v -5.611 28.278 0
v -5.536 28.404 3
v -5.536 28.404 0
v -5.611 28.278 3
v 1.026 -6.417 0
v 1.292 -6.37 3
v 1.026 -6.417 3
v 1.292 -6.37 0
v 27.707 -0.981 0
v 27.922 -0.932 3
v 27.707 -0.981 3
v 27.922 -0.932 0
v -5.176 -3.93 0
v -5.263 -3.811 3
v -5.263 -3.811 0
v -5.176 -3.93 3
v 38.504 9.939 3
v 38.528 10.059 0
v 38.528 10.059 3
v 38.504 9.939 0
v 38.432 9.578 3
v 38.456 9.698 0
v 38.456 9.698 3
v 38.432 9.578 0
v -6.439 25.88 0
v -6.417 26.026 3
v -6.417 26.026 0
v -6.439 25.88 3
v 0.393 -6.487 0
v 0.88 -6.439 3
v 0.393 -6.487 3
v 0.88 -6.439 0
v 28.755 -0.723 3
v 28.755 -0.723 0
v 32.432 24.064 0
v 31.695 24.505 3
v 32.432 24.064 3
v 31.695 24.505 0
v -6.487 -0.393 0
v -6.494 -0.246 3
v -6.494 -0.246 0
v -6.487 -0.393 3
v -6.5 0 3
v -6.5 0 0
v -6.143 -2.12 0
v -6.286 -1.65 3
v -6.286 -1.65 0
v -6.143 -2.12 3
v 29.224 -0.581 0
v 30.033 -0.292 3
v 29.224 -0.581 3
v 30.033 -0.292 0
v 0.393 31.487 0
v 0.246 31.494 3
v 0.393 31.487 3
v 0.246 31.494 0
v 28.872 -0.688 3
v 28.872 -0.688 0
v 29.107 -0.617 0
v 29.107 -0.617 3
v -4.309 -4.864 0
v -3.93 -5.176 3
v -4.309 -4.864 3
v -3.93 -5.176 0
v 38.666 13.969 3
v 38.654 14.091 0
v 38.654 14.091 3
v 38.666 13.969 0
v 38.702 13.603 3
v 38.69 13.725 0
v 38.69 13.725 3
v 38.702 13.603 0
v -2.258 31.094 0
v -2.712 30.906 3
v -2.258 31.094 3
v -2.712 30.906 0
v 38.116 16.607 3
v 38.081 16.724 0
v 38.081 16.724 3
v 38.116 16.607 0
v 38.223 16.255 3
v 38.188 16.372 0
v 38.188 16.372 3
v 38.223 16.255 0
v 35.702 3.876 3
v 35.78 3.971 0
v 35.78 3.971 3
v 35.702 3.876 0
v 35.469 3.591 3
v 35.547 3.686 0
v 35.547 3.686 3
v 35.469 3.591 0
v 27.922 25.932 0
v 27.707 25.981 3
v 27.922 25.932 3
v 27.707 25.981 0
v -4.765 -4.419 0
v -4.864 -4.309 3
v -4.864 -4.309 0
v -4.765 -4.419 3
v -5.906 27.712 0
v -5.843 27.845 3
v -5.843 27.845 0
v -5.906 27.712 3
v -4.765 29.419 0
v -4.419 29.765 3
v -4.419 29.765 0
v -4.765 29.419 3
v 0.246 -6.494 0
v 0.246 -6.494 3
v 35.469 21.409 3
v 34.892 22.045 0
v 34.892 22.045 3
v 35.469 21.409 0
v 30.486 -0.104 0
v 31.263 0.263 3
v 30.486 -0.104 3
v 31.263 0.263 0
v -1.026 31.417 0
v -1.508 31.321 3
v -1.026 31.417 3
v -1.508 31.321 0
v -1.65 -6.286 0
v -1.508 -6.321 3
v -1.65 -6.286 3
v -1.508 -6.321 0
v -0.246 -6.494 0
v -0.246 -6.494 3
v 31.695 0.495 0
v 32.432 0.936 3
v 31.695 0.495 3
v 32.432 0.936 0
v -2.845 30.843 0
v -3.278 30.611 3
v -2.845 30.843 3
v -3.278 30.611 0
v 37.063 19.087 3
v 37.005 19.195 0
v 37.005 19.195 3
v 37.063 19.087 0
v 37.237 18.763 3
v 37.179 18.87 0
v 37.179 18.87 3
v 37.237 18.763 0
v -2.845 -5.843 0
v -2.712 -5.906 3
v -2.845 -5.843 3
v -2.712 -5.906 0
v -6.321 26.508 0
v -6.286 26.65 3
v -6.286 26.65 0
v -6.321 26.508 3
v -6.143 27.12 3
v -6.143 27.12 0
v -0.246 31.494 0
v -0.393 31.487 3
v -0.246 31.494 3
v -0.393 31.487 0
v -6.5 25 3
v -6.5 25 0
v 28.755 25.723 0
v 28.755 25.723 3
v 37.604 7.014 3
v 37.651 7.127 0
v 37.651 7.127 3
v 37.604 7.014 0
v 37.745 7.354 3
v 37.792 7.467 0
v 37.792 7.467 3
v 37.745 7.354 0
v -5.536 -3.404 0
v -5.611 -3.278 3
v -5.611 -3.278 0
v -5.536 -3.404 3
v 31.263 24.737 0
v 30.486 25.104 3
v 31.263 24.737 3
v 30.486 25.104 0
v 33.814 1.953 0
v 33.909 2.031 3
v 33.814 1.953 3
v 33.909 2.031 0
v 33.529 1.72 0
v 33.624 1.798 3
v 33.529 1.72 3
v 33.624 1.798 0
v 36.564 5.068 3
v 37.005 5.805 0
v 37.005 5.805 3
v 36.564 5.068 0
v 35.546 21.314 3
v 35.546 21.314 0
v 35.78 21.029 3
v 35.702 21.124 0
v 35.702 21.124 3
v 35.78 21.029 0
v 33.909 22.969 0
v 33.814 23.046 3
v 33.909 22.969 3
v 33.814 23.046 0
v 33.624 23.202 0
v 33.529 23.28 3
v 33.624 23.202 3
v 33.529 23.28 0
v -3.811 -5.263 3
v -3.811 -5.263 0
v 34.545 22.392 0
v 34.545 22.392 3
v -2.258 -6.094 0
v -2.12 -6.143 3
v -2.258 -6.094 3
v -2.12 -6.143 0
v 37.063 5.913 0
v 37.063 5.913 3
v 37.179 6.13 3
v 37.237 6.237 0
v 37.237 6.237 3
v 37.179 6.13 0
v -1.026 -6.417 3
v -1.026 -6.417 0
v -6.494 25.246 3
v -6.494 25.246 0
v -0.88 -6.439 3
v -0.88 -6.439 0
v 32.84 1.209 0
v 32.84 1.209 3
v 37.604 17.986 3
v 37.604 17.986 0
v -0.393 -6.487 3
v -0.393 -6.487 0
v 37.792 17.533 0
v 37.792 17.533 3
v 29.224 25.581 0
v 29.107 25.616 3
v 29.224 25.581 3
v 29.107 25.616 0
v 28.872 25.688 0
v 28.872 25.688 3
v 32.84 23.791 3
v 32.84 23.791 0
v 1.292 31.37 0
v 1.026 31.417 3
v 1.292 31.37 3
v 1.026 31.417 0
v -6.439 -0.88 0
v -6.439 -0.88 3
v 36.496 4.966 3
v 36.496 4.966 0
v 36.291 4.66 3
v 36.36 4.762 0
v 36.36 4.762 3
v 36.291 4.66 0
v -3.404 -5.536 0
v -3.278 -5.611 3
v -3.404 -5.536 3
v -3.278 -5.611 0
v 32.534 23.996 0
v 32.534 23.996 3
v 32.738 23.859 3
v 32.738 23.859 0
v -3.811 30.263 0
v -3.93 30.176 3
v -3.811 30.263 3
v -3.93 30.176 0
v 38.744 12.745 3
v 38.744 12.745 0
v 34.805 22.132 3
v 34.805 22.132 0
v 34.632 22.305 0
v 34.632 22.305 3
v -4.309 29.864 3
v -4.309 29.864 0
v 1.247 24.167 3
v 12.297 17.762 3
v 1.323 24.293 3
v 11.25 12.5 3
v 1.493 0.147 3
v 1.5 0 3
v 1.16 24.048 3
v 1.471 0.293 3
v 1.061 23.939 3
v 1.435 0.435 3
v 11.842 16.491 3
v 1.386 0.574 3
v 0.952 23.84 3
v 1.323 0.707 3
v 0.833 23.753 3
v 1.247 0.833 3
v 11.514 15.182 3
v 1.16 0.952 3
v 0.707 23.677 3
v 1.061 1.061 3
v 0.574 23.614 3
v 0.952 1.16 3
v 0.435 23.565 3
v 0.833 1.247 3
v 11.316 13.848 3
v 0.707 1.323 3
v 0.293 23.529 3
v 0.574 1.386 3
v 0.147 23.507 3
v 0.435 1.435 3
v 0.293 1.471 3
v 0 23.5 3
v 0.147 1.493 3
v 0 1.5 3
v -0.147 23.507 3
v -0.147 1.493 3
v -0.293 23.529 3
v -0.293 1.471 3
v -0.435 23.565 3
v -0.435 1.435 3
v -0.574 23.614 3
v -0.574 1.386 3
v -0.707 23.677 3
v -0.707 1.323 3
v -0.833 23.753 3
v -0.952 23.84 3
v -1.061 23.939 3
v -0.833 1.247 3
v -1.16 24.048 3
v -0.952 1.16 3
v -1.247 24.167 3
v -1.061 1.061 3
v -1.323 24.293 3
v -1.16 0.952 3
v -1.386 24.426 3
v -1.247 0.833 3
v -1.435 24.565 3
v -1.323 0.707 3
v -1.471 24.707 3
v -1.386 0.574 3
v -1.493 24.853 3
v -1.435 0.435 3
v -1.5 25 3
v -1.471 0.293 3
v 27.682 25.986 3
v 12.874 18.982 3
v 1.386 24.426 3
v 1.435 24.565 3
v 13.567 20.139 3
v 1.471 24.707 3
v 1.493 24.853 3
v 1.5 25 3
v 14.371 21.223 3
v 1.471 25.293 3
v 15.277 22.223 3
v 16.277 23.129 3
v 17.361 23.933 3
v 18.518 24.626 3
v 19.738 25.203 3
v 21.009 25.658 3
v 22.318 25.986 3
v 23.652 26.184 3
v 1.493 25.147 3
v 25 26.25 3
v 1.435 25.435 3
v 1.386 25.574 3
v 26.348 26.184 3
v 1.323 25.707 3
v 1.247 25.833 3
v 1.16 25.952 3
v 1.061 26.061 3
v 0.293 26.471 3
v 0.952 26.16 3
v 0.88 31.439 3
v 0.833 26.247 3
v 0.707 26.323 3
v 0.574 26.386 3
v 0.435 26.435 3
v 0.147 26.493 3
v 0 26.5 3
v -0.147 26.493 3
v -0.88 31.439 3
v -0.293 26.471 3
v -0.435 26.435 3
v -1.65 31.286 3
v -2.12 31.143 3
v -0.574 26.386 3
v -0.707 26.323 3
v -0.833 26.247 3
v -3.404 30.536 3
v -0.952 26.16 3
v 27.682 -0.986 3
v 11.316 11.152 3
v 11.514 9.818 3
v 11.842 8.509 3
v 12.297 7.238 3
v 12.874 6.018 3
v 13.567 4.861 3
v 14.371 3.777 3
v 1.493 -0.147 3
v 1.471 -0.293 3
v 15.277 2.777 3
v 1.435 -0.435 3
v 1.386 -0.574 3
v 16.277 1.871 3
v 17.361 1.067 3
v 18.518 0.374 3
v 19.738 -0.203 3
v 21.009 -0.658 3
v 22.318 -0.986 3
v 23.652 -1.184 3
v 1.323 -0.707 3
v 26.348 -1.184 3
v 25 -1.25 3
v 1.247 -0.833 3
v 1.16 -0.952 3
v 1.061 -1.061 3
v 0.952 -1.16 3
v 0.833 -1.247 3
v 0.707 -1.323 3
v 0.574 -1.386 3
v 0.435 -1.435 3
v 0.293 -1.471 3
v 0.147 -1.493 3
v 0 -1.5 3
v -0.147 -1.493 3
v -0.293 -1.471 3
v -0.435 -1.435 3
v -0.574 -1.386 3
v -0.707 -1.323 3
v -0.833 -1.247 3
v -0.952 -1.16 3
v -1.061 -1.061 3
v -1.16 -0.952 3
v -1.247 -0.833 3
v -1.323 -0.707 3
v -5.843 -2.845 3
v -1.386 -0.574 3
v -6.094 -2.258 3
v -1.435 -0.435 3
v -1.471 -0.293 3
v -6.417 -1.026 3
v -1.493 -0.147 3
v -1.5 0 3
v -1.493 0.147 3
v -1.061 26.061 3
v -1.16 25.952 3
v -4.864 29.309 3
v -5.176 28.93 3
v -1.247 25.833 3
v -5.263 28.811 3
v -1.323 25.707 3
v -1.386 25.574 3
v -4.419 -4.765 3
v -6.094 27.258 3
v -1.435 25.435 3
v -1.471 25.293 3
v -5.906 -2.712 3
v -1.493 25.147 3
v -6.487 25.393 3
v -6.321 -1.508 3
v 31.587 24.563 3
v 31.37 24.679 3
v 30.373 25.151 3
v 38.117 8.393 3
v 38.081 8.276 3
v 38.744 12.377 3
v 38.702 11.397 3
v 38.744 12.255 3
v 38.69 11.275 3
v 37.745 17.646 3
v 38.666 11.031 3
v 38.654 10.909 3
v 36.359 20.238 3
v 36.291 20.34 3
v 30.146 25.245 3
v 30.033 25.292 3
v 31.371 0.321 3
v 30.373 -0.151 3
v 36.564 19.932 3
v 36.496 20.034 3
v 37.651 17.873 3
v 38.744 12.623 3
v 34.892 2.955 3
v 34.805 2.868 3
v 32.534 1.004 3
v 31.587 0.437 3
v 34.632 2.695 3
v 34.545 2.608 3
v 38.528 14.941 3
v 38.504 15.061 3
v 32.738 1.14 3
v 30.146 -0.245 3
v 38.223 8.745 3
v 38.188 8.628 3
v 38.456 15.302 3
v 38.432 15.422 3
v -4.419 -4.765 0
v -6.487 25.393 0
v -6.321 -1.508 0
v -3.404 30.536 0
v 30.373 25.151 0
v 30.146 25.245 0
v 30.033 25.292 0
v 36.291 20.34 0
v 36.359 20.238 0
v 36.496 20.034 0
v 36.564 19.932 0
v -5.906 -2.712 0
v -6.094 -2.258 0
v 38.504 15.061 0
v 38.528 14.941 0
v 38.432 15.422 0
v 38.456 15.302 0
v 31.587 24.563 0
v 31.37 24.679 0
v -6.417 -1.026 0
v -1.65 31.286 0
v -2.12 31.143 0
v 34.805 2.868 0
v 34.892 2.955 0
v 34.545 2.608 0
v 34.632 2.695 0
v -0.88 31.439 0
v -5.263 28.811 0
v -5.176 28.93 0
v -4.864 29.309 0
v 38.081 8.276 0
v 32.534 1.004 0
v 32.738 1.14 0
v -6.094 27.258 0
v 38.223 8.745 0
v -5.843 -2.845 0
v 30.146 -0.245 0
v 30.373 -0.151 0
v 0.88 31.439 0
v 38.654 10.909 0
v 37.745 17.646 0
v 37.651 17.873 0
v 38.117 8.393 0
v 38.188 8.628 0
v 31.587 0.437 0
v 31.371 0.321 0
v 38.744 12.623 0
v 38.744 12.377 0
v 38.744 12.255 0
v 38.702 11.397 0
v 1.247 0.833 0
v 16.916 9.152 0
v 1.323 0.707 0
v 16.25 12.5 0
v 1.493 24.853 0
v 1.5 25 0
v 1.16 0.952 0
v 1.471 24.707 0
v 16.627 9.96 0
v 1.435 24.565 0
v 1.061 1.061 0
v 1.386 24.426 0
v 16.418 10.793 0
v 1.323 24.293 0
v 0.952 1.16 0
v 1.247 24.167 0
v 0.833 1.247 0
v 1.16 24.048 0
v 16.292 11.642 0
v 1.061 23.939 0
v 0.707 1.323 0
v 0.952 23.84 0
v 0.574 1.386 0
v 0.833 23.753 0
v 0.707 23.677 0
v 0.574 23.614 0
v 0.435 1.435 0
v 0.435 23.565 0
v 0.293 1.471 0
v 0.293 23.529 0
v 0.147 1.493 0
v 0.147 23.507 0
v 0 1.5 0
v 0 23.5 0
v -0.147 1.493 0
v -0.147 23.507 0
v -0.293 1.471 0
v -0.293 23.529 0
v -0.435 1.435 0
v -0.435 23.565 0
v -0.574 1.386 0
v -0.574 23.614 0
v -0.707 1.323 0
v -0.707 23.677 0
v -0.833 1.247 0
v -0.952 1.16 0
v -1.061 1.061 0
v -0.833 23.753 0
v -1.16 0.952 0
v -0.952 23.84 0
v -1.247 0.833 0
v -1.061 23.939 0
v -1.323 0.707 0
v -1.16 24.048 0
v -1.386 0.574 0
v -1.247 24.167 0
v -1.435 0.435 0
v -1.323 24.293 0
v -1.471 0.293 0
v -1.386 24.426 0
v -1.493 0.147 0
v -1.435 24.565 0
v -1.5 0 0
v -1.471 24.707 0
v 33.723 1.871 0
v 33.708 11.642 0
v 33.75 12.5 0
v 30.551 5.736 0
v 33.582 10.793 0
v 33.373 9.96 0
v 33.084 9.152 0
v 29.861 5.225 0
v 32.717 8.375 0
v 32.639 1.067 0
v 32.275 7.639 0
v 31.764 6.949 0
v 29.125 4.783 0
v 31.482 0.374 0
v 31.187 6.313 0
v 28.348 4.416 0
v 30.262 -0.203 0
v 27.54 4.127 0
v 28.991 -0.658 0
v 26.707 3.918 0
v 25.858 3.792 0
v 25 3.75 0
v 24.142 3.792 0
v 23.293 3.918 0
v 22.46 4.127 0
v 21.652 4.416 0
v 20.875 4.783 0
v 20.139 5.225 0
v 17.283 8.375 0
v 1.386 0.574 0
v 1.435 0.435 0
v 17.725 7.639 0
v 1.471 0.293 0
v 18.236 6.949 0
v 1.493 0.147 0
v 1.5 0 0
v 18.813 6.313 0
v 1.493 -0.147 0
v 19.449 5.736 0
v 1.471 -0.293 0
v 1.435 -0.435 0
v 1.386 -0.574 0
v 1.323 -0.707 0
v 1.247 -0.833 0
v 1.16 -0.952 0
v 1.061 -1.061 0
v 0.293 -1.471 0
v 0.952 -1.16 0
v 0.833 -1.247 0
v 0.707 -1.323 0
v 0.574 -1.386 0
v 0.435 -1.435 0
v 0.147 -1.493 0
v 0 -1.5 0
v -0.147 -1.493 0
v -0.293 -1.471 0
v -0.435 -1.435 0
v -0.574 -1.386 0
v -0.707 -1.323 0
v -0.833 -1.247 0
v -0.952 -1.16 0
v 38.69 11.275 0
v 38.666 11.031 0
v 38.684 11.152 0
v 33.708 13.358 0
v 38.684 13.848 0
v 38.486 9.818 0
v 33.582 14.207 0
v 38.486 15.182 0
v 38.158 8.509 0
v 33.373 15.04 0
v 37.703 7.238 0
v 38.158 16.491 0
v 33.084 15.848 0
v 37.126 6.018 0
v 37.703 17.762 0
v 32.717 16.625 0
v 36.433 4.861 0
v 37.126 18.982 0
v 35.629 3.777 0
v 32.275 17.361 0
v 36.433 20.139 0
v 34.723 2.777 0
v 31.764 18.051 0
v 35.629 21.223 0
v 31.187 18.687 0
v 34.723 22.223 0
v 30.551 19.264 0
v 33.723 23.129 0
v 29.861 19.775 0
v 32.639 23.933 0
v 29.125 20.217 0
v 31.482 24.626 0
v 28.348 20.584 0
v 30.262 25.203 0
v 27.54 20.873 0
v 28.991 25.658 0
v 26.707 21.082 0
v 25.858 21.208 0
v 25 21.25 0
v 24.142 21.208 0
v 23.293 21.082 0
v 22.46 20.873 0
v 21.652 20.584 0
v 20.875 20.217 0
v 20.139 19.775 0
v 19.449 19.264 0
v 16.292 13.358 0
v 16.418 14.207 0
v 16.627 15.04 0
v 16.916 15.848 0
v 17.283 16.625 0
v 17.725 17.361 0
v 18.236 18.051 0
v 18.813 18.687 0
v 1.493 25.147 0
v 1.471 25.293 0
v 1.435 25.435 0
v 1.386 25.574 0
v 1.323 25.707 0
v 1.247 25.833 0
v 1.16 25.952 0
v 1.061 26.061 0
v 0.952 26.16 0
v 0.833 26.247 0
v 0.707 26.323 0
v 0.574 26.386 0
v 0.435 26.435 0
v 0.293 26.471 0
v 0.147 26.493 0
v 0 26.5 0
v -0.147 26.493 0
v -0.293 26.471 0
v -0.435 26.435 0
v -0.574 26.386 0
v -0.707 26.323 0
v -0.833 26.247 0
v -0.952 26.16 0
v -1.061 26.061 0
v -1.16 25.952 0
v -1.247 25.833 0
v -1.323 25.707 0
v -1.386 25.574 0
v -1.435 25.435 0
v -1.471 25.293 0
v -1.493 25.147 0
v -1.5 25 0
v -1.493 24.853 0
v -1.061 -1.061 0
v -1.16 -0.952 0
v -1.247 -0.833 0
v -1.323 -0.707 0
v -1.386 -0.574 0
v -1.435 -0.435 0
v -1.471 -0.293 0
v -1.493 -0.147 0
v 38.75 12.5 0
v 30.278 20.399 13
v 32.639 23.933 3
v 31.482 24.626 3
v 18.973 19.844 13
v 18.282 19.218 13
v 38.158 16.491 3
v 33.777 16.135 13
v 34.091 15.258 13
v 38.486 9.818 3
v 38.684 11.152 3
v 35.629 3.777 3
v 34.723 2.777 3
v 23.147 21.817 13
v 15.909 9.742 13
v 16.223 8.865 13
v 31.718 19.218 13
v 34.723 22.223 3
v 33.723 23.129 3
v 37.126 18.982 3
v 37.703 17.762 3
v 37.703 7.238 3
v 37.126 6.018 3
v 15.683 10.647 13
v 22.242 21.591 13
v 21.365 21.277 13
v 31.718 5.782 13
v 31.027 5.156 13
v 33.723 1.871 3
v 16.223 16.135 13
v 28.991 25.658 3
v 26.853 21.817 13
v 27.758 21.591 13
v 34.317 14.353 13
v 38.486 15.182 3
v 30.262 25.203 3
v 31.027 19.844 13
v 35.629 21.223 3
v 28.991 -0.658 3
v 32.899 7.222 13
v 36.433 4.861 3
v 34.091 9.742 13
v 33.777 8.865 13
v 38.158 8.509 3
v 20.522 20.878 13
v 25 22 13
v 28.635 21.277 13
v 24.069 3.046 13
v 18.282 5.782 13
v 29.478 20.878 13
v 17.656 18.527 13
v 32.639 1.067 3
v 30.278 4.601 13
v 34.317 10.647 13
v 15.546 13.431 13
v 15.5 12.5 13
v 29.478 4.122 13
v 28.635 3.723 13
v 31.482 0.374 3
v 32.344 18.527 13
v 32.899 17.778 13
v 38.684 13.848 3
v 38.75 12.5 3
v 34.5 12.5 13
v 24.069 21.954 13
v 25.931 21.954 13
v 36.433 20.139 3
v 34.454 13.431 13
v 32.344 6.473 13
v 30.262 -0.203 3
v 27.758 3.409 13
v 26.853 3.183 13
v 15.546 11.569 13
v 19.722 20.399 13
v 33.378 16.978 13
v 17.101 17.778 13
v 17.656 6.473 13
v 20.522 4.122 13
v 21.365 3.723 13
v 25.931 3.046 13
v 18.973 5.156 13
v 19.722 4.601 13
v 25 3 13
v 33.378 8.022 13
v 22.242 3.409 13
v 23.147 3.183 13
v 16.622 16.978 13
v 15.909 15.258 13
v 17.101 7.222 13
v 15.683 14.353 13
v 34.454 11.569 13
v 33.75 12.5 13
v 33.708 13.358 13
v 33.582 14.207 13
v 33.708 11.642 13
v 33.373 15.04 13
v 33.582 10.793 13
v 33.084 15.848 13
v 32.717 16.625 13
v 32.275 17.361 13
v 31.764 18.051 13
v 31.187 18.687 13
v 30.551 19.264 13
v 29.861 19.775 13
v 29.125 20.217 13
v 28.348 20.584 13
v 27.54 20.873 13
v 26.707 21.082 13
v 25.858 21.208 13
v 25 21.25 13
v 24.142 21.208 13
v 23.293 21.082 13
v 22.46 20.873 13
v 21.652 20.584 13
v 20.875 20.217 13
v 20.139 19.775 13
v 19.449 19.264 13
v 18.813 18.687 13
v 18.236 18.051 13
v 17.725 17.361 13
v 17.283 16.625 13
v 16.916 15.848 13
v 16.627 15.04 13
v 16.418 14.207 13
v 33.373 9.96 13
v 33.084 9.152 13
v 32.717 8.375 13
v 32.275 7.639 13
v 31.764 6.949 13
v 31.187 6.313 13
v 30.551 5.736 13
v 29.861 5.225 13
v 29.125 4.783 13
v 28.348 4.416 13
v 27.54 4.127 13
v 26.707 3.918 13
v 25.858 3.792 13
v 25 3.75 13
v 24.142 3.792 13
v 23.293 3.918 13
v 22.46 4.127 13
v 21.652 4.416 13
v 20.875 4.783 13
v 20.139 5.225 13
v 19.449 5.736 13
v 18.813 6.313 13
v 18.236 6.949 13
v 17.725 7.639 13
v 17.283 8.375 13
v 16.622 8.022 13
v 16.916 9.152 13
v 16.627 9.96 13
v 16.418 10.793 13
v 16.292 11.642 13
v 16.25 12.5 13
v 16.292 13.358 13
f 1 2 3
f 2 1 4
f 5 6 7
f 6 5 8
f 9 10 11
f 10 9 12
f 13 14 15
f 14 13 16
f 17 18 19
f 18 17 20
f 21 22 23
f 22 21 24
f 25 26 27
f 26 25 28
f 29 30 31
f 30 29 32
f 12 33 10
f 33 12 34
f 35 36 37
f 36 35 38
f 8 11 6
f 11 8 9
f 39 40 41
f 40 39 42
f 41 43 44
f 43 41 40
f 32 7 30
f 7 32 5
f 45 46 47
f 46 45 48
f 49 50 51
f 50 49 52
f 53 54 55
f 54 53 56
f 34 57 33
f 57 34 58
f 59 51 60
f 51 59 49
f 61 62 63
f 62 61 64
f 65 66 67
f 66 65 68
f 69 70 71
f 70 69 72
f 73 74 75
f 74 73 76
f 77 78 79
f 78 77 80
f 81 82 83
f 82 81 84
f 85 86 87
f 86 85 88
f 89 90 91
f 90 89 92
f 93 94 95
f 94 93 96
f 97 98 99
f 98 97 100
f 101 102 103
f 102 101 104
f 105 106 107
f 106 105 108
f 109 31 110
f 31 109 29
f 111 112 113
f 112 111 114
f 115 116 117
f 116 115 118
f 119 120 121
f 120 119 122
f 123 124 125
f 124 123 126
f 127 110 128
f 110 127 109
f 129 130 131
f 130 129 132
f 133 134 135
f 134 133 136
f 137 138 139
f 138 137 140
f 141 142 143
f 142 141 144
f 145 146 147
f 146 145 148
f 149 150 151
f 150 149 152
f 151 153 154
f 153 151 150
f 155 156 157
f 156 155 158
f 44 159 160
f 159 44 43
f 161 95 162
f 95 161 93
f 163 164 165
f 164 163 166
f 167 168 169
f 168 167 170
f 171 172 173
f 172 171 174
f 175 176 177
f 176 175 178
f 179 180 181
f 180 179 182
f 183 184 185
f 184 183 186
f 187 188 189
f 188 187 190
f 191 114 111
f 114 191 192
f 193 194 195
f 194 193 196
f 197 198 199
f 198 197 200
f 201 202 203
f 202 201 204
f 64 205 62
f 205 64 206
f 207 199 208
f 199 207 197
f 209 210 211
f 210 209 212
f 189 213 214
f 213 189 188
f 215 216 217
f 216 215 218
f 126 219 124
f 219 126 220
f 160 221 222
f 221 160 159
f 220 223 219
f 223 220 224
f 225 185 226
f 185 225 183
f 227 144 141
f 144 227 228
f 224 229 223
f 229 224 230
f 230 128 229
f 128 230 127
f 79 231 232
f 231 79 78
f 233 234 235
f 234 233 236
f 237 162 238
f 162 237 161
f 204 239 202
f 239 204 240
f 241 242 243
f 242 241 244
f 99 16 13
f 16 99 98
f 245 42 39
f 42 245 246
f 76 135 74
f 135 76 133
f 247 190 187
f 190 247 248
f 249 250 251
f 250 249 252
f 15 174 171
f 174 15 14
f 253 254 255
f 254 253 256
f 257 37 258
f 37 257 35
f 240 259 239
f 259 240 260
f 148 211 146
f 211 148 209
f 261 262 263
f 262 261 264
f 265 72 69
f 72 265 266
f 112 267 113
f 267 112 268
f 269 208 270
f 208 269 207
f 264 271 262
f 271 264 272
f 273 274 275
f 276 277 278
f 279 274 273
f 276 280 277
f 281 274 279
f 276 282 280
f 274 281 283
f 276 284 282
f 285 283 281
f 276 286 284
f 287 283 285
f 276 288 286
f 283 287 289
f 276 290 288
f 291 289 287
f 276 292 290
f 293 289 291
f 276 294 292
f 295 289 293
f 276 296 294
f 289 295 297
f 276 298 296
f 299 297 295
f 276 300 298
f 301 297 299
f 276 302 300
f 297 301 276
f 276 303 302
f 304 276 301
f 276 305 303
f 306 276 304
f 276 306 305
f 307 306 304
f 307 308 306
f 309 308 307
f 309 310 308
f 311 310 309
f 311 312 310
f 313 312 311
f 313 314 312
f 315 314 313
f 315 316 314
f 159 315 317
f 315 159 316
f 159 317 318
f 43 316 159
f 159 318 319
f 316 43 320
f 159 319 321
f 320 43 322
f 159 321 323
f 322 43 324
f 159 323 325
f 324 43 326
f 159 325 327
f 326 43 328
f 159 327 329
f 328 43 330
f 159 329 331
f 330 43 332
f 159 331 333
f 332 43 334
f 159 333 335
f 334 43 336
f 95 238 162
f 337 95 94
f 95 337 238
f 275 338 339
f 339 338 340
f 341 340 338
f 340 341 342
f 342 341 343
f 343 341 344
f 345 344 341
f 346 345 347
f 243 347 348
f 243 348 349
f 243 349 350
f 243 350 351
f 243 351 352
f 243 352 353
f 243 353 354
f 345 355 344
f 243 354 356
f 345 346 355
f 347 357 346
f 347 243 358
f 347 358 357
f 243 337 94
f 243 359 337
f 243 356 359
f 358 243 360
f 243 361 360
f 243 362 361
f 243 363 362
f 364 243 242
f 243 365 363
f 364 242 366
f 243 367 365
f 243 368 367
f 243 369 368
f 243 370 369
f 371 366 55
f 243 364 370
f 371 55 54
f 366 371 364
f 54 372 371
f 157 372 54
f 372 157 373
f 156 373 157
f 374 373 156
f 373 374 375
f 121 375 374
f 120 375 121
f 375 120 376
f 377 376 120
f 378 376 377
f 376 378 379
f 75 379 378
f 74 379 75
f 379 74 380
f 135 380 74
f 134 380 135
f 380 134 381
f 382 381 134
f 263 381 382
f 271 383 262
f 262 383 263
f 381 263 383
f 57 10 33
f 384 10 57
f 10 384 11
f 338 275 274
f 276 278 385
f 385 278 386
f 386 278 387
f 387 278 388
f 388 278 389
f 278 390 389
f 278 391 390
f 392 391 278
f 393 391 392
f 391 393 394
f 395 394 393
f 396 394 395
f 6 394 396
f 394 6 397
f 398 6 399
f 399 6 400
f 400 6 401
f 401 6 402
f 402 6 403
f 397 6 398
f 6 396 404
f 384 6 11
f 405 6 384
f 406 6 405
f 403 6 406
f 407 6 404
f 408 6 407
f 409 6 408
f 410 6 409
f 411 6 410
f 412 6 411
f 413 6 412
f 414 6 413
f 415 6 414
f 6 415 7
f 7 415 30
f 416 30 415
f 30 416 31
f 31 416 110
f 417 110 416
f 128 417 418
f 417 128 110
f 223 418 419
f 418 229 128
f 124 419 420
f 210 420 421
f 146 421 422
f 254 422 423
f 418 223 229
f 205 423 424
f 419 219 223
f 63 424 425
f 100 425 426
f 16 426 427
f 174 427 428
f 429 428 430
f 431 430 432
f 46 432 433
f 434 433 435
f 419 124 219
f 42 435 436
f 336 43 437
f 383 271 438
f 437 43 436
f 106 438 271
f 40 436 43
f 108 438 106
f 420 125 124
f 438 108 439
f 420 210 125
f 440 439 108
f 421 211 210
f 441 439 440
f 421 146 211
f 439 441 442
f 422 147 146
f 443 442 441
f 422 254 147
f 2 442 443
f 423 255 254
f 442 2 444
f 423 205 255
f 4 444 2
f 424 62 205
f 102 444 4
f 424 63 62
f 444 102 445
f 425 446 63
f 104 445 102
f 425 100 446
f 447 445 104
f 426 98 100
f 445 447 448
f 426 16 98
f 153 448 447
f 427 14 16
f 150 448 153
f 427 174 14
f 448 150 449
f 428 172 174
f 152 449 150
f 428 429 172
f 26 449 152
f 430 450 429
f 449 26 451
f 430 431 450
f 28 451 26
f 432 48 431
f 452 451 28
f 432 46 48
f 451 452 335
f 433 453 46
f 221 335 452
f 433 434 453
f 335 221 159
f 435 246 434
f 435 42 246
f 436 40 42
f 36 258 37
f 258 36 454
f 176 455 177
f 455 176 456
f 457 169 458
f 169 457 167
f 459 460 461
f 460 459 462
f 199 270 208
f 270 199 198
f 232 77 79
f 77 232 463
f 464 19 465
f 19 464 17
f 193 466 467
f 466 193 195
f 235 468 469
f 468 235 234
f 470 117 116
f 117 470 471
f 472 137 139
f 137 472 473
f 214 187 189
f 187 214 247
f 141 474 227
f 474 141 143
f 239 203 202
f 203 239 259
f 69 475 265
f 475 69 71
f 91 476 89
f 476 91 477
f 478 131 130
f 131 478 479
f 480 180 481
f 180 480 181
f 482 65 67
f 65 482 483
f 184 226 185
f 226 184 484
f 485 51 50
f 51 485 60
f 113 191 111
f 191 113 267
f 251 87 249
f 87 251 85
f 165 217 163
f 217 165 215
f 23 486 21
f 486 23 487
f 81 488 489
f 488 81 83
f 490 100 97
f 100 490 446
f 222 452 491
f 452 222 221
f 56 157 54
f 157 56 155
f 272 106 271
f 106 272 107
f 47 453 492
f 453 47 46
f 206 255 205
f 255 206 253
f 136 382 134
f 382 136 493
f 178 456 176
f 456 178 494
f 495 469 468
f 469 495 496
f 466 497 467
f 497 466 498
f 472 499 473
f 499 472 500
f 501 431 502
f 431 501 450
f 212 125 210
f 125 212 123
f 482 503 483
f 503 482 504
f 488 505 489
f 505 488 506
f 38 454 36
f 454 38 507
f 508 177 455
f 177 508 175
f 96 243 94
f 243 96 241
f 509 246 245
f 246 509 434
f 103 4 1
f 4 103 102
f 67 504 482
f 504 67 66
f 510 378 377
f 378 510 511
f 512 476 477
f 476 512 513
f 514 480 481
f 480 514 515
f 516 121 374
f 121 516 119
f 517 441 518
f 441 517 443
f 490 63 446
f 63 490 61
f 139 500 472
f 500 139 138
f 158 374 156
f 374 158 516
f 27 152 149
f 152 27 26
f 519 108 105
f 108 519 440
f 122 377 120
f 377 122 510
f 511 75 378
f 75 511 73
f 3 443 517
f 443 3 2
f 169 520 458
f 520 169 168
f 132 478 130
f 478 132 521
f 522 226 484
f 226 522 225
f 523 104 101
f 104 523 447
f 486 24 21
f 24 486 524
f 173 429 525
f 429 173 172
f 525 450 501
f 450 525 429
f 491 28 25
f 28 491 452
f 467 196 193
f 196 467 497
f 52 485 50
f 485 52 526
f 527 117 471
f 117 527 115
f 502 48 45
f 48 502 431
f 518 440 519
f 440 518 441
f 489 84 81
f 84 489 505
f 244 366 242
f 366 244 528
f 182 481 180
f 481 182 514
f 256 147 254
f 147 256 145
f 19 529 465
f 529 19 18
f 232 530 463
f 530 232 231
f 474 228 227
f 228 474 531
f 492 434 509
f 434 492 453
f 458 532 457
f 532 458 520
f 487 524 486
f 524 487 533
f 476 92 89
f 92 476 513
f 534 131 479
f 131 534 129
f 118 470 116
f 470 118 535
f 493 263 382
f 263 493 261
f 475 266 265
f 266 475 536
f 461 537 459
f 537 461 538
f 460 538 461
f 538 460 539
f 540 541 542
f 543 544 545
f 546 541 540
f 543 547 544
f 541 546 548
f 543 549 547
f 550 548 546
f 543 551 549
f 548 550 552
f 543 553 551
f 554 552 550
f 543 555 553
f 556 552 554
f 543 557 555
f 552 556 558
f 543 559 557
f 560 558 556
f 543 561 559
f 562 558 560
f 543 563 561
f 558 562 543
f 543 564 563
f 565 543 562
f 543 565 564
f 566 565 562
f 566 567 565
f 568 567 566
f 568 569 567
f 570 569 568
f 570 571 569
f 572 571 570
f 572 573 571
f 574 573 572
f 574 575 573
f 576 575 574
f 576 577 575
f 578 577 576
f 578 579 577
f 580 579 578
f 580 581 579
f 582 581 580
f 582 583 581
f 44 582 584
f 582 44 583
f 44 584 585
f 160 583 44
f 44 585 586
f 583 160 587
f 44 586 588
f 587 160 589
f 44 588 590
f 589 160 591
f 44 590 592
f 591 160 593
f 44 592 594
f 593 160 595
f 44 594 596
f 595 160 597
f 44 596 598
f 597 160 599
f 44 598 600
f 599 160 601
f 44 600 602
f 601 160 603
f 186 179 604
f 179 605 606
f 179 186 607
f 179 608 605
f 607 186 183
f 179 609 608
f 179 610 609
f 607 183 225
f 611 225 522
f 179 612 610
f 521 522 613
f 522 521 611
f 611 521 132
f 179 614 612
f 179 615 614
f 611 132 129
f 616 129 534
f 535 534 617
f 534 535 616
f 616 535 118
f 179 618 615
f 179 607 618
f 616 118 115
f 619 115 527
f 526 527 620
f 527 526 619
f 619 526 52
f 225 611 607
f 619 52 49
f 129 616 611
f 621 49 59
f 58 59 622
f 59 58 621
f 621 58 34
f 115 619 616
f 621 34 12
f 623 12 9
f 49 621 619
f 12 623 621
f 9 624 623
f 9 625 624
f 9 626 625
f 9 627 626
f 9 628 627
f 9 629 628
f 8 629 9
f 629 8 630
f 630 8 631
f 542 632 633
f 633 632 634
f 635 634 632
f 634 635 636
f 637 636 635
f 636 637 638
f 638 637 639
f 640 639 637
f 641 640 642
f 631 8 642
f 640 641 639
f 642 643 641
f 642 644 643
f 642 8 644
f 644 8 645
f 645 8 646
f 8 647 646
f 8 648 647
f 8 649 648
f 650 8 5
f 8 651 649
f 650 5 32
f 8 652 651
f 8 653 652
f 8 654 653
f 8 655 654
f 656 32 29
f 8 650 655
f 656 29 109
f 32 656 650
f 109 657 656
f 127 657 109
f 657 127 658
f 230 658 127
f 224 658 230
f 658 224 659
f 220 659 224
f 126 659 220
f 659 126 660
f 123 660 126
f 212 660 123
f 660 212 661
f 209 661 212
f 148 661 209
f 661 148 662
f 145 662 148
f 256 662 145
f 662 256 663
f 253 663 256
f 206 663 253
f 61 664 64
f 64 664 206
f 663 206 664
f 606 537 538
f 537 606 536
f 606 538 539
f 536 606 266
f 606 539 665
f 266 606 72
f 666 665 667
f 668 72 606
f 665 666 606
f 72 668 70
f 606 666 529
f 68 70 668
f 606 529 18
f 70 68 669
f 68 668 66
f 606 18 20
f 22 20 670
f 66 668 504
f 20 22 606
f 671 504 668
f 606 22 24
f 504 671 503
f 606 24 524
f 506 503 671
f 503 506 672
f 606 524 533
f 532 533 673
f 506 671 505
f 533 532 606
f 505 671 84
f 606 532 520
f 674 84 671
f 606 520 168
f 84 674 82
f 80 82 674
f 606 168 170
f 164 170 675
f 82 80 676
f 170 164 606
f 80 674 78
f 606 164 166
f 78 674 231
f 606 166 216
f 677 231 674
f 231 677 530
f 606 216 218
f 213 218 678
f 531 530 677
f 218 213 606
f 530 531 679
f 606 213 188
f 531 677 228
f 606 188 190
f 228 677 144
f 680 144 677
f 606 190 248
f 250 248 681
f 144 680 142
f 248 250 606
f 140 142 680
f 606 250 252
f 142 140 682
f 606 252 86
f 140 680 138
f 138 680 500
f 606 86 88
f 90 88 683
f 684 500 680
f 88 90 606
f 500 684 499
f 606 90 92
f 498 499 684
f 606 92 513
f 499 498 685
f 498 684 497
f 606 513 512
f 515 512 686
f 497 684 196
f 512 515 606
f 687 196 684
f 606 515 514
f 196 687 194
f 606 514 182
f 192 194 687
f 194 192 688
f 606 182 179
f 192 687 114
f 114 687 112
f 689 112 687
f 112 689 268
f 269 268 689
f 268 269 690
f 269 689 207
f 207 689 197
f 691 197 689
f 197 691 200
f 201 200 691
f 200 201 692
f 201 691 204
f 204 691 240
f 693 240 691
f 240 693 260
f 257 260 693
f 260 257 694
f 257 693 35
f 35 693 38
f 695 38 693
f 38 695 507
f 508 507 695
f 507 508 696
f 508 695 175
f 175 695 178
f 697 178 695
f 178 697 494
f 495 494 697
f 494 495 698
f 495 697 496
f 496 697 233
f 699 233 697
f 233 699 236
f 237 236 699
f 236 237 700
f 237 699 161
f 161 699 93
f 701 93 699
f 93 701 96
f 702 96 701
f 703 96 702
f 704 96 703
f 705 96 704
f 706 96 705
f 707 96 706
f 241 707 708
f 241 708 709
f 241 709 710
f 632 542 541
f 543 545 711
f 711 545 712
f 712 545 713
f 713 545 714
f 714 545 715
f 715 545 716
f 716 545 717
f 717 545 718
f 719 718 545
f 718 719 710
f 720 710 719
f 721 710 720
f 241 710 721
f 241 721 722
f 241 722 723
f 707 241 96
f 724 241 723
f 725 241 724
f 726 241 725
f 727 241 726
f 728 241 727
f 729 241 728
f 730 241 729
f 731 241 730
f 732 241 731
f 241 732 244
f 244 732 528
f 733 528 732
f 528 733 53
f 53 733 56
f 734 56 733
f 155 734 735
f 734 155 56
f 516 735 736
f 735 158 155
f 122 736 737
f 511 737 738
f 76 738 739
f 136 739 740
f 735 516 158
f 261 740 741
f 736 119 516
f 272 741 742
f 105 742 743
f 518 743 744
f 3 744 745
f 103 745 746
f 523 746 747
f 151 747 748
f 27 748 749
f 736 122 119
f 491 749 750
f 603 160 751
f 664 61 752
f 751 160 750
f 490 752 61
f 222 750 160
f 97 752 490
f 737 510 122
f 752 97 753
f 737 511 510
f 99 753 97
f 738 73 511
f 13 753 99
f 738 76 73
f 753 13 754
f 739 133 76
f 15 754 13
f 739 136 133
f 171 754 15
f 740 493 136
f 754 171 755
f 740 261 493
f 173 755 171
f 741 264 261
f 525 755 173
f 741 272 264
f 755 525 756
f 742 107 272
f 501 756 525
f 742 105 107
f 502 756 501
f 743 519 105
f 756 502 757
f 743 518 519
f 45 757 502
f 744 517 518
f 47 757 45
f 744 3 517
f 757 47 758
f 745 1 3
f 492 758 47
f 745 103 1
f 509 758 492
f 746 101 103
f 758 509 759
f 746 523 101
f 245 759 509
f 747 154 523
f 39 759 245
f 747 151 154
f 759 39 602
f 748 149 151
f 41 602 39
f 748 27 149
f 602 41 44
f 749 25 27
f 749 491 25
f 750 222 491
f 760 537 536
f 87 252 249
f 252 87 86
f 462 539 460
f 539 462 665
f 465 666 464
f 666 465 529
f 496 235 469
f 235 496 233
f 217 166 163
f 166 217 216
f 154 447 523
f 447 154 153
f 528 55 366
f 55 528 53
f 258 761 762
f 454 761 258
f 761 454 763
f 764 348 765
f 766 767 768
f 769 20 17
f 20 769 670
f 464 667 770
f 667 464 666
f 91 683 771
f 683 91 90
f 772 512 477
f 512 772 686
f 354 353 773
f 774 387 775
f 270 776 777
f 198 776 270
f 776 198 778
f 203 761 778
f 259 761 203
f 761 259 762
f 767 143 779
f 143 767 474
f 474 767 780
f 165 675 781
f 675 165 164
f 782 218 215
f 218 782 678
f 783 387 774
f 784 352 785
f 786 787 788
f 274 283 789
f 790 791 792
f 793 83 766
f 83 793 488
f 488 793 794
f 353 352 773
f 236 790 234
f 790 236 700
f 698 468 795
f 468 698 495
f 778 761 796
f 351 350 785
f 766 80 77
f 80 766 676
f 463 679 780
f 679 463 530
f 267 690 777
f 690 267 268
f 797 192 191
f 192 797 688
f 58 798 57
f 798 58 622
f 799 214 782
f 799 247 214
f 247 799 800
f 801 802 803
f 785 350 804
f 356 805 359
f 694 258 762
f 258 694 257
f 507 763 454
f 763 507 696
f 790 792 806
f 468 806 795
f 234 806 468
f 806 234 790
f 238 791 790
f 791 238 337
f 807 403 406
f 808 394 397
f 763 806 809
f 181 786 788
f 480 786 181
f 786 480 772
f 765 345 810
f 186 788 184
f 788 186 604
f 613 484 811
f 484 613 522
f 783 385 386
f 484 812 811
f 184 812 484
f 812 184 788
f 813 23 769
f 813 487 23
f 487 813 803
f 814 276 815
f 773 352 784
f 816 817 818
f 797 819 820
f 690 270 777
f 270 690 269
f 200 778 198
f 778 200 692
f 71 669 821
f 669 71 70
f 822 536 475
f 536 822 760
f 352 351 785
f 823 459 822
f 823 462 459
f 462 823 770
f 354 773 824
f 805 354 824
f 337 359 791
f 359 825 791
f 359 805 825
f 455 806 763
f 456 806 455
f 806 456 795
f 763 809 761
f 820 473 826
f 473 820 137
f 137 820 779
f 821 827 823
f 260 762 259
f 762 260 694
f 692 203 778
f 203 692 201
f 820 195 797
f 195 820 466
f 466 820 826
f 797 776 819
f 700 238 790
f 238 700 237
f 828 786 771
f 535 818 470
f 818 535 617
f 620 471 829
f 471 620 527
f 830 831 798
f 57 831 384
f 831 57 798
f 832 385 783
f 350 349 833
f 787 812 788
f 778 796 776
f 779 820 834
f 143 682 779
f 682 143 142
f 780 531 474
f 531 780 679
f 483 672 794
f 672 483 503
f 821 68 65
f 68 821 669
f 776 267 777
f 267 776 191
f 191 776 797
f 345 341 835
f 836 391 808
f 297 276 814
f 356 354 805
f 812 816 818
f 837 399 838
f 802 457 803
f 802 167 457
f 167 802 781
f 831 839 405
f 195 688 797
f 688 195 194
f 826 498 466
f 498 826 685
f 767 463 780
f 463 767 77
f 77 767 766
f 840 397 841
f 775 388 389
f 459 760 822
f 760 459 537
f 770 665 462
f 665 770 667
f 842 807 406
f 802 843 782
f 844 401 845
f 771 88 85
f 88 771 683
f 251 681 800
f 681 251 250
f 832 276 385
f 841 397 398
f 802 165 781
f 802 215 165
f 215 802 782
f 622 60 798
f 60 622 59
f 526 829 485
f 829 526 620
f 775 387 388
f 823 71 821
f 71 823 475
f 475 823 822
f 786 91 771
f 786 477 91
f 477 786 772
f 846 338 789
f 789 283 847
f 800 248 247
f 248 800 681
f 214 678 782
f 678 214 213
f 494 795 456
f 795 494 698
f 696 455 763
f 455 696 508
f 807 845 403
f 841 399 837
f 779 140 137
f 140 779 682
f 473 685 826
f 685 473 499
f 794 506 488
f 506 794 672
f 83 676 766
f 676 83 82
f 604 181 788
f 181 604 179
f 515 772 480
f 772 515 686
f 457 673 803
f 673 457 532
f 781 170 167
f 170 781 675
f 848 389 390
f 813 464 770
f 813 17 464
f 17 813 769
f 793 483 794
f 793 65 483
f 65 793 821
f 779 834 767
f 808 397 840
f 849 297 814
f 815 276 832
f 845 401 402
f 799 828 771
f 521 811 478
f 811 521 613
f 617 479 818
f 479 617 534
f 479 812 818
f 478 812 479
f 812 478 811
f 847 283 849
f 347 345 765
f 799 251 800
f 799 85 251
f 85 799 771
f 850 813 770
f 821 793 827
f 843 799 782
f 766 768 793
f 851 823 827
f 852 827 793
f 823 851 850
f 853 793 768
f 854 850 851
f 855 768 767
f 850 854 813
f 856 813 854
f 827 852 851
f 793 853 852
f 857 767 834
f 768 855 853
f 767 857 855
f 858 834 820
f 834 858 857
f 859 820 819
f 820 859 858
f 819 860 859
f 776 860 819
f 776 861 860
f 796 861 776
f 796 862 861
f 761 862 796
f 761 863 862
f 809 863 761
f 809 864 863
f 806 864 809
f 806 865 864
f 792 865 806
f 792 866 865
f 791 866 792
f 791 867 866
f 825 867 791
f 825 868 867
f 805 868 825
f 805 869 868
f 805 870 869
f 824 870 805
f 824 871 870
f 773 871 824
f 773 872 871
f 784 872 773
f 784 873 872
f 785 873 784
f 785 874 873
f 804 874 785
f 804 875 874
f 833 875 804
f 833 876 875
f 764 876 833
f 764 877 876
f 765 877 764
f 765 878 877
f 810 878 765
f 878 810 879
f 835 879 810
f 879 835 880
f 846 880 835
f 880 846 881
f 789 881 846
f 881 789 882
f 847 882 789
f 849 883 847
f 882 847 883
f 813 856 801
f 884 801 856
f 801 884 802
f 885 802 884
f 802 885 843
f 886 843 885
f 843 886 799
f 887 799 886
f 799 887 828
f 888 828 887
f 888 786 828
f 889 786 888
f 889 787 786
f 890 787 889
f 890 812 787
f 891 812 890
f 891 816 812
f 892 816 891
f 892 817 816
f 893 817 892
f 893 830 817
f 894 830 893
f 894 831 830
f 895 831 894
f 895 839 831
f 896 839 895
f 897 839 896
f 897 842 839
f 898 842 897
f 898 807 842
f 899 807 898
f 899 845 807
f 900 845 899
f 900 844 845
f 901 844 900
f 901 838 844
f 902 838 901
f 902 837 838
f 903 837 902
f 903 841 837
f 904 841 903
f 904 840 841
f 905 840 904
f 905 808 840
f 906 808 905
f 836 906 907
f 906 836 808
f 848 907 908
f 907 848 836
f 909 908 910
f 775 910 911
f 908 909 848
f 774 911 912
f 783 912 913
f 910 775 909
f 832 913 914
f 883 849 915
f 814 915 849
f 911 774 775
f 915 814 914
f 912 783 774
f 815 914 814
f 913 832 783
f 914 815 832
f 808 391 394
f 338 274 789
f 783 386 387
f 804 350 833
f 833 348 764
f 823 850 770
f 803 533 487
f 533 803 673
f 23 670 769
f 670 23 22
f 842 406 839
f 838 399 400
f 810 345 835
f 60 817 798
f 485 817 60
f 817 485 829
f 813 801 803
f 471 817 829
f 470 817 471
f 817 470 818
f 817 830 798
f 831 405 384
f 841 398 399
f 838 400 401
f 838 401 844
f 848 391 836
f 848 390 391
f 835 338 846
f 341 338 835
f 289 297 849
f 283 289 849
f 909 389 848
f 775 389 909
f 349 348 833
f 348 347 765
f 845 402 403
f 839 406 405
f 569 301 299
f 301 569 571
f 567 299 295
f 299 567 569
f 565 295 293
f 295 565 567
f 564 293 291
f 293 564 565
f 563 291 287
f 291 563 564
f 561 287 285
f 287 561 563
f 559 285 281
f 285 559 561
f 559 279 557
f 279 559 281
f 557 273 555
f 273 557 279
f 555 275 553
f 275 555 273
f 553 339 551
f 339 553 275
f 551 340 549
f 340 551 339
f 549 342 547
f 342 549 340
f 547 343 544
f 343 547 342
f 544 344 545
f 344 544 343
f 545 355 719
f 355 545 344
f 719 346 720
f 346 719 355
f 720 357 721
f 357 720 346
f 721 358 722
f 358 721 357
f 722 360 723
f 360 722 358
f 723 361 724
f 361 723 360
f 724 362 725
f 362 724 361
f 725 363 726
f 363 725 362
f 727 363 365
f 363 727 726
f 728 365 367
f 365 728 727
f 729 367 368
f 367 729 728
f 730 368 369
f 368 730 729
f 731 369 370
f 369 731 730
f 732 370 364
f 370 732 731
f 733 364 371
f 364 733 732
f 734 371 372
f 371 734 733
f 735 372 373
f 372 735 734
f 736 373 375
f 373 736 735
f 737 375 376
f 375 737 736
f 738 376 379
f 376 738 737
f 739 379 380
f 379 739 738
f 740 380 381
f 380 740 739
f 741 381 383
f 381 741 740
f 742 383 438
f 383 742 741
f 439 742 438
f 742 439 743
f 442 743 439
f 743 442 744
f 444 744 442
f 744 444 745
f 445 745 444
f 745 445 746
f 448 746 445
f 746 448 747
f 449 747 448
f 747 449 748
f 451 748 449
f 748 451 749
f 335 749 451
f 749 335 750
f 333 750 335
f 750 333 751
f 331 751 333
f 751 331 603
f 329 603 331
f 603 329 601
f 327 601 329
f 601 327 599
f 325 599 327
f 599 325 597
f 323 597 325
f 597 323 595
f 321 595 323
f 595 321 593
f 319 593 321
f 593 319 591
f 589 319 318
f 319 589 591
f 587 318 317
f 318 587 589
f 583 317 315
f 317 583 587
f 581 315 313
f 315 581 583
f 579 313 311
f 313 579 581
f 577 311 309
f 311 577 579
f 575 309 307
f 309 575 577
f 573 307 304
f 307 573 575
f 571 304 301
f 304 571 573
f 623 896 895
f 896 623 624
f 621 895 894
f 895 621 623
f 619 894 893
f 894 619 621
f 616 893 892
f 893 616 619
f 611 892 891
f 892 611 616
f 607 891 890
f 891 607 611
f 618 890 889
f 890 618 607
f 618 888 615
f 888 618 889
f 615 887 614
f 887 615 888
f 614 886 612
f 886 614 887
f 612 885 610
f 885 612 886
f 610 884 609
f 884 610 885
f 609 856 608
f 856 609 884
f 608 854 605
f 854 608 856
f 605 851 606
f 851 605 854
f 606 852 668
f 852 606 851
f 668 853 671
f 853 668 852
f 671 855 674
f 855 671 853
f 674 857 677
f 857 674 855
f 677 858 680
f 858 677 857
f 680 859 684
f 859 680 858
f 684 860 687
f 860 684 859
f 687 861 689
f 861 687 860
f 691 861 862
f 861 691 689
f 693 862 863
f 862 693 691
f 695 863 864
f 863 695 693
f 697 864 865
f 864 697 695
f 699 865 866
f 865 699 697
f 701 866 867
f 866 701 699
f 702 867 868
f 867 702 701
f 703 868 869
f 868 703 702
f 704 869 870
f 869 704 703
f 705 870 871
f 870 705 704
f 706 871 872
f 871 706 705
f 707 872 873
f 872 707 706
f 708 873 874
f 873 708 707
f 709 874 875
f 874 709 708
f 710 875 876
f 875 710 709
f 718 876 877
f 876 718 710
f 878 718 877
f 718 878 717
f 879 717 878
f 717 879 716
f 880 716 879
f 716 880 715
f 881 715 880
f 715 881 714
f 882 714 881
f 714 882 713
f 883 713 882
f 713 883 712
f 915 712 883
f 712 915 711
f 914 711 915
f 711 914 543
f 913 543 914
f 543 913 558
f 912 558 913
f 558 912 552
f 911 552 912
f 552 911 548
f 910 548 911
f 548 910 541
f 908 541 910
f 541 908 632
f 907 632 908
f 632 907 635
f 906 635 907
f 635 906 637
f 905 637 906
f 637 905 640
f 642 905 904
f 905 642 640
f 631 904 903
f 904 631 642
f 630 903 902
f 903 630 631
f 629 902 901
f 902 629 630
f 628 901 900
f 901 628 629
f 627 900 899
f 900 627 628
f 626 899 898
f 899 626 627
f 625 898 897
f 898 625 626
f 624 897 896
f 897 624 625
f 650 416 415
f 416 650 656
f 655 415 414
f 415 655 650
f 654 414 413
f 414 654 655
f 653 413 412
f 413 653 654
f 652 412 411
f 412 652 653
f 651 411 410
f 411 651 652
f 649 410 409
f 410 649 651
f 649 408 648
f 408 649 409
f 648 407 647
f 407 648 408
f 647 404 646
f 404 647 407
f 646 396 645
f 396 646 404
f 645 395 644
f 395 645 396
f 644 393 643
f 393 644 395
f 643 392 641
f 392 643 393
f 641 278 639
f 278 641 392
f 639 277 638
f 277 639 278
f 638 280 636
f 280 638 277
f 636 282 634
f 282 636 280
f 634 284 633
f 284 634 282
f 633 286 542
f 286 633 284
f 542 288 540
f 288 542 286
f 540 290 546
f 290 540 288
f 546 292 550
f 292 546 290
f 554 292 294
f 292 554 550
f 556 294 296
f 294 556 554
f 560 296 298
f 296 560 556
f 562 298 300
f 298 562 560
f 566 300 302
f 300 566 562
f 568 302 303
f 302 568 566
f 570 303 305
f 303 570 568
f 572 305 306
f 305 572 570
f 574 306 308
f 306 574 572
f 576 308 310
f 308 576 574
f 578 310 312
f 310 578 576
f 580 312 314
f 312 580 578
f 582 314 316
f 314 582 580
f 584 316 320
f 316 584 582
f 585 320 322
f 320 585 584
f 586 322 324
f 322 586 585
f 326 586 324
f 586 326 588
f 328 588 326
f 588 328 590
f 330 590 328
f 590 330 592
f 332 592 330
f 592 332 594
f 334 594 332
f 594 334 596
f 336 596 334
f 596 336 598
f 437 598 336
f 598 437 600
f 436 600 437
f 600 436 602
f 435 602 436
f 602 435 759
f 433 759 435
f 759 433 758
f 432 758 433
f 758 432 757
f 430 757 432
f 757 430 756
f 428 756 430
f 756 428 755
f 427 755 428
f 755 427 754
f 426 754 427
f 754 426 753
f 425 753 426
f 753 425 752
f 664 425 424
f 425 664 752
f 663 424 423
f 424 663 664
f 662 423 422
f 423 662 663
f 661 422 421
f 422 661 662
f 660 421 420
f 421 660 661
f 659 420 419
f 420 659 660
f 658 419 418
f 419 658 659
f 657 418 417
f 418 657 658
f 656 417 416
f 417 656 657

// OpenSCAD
module holes(){
        circle(d=3);
        translate([0,25])
        circle(d=3);
        translate([25,25/2])
        circle(d=17.5);
}
$fn=64;
difference(){
    union()
    {
        linear_extrude(3) {
            offset(r=5)
            hull(){
                holes();
            }
        }
        translate([25,25/2])
        hull() {
            cylinder(d=17.5+10, h=3);
            cylinder(d=17+2, h=13);
        }
    }
   linear_extrude(30, center=true) {
       holes();
   }
}
